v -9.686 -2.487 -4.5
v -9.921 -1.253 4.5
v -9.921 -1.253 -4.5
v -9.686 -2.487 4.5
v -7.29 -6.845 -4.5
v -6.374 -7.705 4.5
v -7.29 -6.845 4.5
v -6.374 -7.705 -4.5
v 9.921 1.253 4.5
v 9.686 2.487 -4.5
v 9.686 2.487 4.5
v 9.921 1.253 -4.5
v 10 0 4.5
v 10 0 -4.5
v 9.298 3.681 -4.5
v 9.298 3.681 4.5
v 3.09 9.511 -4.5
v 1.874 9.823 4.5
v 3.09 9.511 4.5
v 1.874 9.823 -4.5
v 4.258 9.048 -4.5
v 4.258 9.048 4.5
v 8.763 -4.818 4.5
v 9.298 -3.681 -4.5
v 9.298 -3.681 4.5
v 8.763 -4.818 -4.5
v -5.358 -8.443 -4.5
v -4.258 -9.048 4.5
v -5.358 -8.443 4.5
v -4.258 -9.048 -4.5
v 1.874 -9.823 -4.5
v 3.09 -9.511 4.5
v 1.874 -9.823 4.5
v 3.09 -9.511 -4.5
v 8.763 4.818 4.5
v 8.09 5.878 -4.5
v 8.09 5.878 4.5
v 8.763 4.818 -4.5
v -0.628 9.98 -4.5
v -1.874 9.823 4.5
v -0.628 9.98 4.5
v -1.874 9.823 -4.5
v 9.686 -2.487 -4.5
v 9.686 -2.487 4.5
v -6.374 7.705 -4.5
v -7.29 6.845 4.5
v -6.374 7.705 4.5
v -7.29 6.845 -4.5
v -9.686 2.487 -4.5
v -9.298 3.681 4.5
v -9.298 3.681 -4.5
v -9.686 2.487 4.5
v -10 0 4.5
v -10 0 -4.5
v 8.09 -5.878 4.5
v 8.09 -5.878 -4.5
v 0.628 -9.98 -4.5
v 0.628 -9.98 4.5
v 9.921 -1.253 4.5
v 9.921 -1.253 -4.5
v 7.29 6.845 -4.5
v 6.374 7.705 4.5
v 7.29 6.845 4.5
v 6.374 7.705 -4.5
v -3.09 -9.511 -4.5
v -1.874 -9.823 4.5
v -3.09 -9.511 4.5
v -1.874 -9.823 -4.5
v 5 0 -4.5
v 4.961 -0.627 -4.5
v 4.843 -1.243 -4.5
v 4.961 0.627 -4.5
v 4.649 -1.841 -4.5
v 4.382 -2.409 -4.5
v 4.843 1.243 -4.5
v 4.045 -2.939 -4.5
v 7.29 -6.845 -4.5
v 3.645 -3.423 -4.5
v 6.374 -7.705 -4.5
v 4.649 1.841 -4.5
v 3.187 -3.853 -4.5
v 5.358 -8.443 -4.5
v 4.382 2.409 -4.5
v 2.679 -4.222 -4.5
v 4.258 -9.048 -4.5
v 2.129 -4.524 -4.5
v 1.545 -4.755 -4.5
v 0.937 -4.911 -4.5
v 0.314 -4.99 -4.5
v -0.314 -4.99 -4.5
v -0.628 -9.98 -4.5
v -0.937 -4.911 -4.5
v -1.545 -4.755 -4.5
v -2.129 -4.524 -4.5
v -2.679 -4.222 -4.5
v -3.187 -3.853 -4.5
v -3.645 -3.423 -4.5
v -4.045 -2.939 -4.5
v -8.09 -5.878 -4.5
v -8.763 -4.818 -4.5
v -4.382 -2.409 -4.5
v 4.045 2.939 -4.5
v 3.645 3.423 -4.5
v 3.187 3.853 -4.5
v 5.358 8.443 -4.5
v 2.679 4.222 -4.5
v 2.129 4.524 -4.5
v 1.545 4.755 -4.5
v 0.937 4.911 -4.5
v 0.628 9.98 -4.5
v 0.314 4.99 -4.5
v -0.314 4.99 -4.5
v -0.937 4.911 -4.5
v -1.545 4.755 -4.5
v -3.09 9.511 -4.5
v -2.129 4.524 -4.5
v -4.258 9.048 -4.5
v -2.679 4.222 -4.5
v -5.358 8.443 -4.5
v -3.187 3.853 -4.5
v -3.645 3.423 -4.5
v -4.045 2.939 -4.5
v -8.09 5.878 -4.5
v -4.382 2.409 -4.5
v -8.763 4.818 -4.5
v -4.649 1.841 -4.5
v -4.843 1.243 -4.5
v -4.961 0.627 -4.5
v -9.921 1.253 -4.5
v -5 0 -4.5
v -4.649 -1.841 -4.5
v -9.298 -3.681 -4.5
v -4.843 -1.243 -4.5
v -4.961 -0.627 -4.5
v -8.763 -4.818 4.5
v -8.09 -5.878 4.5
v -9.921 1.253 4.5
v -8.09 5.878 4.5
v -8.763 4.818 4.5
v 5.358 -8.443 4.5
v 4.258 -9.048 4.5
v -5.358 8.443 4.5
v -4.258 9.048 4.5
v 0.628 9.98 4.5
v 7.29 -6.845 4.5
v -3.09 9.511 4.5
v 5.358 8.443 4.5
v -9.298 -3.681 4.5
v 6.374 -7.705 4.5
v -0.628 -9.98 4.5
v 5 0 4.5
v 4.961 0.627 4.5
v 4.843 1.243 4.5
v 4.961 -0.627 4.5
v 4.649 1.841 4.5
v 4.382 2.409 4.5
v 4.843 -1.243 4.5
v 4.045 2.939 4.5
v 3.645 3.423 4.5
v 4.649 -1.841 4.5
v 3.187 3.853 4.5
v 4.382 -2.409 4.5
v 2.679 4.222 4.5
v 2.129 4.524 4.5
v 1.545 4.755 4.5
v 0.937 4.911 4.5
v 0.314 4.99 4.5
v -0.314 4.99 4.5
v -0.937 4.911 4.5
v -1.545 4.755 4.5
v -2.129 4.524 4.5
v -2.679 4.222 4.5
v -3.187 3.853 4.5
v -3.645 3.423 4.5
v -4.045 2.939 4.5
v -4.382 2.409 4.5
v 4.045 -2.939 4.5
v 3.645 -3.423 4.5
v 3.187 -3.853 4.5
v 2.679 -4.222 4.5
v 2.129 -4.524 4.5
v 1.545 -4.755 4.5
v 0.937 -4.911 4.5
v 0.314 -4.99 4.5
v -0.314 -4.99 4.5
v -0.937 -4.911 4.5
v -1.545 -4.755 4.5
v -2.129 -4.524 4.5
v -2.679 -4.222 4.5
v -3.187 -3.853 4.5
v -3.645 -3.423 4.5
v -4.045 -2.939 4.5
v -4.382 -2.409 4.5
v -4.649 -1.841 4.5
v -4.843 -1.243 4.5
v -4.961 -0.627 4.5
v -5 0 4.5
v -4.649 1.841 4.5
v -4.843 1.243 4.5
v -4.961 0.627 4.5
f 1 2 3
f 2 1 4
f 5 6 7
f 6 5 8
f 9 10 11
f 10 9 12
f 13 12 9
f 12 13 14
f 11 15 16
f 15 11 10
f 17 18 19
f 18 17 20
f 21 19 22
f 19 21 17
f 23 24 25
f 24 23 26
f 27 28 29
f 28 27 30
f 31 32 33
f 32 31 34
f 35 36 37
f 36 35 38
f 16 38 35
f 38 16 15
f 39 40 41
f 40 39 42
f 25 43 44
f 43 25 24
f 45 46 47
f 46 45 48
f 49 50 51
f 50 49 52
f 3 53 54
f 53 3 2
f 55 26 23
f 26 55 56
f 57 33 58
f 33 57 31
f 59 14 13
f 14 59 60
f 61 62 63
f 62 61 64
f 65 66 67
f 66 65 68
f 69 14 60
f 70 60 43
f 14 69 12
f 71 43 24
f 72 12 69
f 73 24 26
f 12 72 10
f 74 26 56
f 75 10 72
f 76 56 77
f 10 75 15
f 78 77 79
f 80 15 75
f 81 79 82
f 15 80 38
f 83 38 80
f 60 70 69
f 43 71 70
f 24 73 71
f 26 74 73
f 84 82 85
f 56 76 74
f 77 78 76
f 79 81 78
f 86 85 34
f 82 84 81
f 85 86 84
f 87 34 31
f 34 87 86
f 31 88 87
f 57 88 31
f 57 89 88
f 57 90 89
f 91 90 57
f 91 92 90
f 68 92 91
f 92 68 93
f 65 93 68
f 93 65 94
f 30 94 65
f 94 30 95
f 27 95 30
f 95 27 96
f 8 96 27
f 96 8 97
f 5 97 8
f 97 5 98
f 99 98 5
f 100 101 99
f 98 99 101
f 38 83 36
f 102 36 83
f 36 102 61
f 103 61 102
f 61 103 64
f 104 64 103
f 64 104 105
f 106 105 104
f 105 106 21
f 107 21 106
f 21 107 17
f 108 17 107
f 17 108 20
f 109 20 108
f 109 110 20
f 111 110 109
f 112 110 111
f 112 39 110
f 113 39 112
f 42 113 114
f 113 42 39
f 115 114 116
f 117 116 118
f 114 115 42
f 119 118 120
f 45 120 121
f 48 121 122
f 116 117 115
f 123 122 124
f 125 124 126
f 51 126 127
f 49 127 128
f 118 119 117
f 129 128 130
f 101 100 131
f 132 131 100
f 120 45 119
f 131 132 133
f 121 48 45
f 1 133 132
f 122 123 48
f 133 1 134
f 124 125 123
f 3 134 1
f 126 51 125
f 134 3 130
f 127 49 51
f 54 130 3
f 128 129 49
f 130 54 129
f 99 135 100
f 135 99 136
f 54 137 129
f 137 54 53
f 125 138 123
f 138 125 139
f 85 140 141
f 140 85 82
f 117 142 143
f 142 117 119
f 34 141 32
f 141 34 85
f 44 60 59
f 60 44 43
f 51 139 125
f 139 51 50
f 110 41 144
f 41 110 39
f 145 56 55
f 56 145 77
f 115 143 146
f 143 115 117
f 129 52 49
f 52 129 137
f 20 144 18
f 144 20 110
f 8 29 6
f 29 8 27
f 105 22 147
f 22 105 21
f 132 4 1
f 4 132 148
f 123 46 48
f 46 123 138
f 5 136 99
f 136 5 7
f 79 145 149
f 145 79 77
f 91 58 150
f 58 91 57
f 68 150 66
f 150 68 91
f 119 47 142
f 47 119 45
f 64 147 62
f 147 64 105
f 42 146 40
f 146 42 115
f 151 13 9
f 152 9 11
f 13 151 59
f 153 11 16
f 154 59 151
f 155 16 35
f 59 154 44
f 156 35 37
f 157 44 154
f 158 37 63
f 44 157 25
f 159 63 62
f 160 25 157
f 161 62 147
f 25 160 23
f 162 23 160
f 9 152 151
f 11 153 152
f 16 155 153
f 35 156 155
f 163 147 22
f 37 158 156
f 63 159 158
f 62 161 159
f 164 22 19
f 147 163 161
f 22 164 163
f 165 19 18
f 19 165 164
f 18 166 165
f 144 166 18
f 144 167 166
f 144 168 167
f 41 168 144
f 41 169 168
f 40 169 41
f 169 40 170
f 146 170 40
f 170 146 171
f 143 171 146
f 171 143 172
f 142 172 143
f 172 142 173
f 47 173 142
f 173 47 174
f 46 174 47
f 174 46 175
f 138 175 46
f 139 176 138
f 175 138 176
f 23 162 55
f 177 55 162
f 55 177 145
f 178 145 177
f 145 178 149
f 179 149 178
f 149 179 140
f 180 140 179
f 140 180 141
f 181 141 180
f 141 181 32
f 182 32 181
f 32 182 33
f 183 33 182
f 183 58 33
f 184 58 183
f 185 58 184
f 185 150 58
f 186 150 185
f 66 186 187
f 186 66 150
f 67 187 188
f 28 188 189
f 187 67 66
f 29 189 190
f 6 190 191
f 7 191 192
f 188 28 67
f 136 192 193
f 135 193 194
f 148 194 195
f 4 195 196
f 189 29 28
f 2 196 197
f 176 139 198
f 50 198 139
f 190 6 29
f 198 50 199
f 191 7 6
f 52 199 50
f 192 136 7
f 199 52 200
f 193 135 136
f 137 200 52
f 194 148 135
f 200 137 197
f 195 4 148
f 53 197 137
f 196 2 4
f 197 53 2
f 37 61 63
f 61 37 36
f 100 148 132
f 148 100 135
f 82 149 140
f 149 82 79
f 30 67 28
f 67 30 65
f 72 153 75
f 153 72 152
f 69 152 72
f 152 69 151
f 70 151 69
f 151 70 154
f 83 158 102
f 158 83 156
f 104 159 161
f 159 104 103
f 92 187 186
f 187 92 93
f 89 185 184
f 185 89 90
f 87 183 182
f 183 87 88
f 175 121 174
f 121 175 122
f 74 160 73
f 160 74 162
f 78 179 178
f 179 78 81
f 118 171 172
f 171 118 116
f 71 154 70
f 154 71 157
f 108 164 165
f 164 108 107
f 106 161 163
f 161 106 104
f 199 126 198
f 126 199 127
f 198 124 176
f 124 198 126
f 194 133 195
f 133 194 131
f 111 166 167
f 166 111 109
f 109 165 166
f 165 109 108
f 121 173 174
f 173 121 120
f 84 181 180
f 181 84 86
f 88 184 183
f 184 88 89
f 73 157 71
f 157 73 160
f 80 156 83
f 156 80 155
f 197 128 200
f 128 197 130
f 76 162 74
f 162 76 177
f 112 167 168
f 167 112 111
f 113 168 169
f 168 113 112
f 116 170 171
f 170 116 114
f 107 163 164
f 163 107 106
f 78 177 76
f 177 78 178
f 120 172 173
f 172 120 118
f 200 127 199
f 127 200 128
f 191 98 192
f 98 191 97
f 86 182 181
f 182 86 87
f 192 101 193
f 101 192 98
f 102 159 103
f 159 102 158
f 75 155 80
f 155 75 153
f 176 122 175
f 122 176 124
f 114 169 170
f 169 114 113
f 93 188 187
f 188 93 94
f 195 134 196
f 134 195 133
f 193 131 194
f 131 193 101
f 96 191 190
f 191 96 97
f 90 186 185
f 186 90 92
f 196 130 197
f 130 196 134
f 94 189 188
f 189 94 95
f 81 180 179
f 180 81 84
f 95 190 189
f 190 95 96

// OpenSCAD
$fn = 50;


difference() {
	union() {
		translate(v = [0, 0, -4.5000000000]) {
			cylinder(h = 9, r = 10.0000000000);
		}
	}
	union() {
		translate(v = [0, 0, -100.0000000000]) {
			cylinder(h = 200, r = 5.0000000000);
		}
	}
}
